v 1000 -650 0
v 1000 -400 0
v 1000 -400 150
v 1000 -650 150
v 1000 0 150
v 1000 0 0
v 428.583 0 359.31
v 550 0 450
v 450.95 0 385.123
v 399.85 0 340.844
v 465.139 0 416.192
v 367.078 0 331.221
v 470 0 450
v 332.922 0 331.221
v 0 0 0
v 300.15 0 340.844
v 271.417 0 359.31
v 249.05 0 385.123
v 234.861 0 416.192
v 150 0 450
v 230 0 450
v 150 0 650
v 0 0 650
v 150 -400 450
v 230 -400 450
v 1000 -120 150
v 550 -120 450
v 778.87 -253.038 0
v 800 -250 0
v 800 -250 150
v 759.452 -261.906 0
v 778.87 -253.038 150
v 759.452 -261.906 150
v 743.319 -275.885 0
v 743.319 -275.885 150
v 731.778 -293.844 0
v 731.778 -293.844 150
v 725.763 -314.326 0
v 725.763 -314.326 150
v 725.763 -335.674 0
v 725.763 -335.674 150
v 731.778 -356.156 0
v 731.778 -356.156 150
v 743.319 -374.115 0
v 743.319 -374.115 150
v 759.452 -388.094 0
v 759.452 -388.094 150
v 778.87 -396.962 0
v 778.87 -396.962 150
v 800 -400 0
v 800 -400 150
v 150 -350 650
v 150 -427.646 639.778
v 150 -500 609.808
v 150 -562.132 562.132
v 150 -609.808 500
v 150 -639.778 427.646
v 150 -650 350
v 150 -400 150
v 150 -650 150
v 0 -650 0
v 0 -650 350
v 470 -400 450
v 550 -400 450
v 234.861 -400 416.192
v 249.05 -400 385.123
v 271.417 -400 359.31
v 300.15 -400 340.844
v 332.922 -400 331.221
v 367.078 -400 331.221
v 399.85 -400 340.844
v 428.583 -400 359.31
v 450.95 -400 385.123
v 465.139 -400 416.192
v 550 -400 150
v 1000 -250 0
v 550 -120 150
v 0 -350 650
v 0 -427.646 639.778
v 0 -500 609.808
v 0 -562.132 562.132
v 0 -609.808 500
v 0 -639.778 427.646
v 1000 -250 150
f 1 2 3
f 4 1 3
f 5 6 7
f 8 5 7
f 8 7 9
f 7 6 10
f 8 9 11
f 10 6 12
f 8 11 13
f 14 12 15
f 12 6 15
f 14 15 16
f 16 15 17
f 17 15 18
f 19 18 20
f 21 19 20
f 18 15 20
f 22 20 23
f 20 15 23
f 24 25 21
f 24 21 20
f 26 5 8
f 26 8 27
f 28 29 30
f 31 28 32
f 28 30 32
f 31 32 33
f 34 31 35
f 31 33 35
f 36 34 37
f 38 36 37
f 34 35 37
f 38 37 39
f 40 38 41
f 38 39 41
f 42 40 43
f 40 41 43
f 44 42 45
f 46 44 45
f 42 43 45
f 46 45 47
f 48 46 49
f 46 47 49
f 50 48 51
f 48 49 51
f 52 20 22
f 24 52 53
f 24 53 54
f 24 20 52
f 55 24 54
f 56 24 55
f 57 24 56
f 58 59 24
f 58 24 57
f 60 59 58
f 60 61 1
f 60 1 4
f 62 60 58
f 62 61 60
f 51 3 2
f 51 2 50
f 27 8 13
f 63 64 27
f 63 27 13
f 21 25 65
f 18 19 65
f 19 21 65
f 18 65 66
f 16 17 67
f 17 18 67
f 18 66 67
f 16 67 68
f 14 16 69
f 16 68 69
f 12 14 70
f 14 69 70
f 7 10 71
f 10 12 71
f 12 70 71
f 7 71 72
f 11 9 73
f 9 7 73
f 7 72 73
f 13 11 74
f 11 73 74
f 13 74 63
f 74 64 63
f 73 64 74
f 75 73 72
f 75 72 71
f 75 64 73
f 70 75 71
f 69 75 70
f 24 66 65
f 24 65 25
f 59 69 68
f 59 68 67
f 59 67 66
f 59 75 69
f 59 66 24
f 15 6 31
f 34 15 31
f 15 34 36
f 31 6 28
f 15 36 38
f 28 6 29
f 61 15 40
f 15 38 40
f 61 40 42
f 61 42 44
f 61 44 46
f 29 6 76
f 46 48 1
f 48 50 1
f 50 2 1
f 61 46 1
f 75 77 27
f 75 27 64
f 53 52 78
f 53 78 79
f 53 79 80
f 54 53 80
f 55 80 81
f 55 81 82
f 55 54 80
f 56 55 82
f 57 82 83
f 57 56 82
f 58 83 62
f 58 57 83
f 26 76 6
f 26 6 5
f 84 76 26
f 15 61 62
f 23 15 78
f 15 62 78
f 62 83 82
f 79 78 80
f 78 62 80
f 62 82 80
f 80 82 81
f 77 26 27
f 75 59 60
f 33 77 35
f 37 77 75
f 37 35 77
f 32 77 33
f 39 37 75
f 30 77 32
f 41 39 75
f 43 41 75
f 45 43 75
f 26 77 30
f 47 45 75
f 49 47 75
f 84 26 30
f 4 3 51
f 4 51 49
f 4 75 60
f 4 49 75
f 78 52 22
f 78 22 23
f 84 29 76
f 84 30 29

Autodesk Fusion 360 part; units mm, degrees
box "BoxPrimitive1" add length 650 width 1000 height 150 placed x (0, -1, 0) y (1, 0, 0) z (0, 0, 1) at (0, 0, 0)
sketch "Sketch3" plane through (0, 0, 150) normal (0, 0, 1) x (-1, 0, 0)
  line L0 (0, 650) -> (-1000, 650)
  line L1 (-1000, 650) -> (-1000, 0)
  line L2 (-1000, 0) -> (0, 0)
  line L3 (0, 0) -> (0, 650)
  line L4 (0, 0) -> (-150, 0)
  line L5 (-150, 0) -> (-150, 650)
  line L6 (-150, 650) -> (0, 650)
  line L7 (0, 650) -> (0, 0)
  line L8 (-150, 0) -> (-550, 0)
  line L9 (-550, 0) -> (-550, 400)
  line L10 (-550, 400) -> (-150, 400)
  line L11 (-150, 400) -> (-150, 0)
  line L12 (-550, 0) -> (-1000, 0)
  line L13 (-1000, 0) -> (-1000, 120)
  line L14 (-1000, 120) -> (-550, 120)
  line L15 (-550, 120) -> (-550, 0)
  line L16 (-800, 250) -> (-1000, 250)
  line L17 (-1000, 250) -> (-1000, 400)
  line L18 (-1000, 400) -> (-800, 400)
  arc A0 (-800, 250) -> (-800, 400) centre (-800, 325) ccw
  dimension "d6" = 150
  dimension "d7" = 400
  dimension "d8" = 400
  dimension "d9" = 120
  dimension "d10" = 150
  dimension "d11" = 200
extrude "Extrude1" add sketch "Sketch3" along normal blind 500 contours L0 L2 L3 L4 L5 L6 L7 L11
extrude "Extrude2" add sketch "Sketch3" along normal blind 300 contours L2 L5 L8 L9 L10 L11 L15 | L1 L2 L9 L12 L13 L14 L15
extrude "Extrude3" cut sketch "Sketch3" against normal blind 300 contours L1 L16 L17 L18 A0
fillet "Fillet1" radius 300 1 edges at (75, -650, 650)
chamfer "Chamfer1" distance 450 distance2 300 1 edges at (1000, -60, 450) measured on face at (283.3333, -173.3333, 450)
sketch "Sketch4" plane through (0, 0, 450) normal (0, 0, 1) x (-1, 0, 0)
  line L0 (-550, 120) -> (-550, 0)
  line L1 (-550, 0) -> (-150, 0)
  line L2 (-150, 0) -> (-150, 400)
  line L3 (-150, 400) -> (-550, 400)
  line L4 (-550, 400) -> (-550, 120)
  line L5 (-350, 0) -> (-470, 0)
  line L6 (-470, 0) -> (-470, 400)
  line L7 (-470, 400) -> (-350, 400)
  line L8 (-350, 400) -> (-350, 0)
  dimension "d22" = 120
  dimension "d23" = 400
revolve "Revolve1" cut sketch "Sketch4" angle 360 about axis through (350, -400, 450) along (0, 1, 0) contours L1 L3 L5 L6 L7 L8
